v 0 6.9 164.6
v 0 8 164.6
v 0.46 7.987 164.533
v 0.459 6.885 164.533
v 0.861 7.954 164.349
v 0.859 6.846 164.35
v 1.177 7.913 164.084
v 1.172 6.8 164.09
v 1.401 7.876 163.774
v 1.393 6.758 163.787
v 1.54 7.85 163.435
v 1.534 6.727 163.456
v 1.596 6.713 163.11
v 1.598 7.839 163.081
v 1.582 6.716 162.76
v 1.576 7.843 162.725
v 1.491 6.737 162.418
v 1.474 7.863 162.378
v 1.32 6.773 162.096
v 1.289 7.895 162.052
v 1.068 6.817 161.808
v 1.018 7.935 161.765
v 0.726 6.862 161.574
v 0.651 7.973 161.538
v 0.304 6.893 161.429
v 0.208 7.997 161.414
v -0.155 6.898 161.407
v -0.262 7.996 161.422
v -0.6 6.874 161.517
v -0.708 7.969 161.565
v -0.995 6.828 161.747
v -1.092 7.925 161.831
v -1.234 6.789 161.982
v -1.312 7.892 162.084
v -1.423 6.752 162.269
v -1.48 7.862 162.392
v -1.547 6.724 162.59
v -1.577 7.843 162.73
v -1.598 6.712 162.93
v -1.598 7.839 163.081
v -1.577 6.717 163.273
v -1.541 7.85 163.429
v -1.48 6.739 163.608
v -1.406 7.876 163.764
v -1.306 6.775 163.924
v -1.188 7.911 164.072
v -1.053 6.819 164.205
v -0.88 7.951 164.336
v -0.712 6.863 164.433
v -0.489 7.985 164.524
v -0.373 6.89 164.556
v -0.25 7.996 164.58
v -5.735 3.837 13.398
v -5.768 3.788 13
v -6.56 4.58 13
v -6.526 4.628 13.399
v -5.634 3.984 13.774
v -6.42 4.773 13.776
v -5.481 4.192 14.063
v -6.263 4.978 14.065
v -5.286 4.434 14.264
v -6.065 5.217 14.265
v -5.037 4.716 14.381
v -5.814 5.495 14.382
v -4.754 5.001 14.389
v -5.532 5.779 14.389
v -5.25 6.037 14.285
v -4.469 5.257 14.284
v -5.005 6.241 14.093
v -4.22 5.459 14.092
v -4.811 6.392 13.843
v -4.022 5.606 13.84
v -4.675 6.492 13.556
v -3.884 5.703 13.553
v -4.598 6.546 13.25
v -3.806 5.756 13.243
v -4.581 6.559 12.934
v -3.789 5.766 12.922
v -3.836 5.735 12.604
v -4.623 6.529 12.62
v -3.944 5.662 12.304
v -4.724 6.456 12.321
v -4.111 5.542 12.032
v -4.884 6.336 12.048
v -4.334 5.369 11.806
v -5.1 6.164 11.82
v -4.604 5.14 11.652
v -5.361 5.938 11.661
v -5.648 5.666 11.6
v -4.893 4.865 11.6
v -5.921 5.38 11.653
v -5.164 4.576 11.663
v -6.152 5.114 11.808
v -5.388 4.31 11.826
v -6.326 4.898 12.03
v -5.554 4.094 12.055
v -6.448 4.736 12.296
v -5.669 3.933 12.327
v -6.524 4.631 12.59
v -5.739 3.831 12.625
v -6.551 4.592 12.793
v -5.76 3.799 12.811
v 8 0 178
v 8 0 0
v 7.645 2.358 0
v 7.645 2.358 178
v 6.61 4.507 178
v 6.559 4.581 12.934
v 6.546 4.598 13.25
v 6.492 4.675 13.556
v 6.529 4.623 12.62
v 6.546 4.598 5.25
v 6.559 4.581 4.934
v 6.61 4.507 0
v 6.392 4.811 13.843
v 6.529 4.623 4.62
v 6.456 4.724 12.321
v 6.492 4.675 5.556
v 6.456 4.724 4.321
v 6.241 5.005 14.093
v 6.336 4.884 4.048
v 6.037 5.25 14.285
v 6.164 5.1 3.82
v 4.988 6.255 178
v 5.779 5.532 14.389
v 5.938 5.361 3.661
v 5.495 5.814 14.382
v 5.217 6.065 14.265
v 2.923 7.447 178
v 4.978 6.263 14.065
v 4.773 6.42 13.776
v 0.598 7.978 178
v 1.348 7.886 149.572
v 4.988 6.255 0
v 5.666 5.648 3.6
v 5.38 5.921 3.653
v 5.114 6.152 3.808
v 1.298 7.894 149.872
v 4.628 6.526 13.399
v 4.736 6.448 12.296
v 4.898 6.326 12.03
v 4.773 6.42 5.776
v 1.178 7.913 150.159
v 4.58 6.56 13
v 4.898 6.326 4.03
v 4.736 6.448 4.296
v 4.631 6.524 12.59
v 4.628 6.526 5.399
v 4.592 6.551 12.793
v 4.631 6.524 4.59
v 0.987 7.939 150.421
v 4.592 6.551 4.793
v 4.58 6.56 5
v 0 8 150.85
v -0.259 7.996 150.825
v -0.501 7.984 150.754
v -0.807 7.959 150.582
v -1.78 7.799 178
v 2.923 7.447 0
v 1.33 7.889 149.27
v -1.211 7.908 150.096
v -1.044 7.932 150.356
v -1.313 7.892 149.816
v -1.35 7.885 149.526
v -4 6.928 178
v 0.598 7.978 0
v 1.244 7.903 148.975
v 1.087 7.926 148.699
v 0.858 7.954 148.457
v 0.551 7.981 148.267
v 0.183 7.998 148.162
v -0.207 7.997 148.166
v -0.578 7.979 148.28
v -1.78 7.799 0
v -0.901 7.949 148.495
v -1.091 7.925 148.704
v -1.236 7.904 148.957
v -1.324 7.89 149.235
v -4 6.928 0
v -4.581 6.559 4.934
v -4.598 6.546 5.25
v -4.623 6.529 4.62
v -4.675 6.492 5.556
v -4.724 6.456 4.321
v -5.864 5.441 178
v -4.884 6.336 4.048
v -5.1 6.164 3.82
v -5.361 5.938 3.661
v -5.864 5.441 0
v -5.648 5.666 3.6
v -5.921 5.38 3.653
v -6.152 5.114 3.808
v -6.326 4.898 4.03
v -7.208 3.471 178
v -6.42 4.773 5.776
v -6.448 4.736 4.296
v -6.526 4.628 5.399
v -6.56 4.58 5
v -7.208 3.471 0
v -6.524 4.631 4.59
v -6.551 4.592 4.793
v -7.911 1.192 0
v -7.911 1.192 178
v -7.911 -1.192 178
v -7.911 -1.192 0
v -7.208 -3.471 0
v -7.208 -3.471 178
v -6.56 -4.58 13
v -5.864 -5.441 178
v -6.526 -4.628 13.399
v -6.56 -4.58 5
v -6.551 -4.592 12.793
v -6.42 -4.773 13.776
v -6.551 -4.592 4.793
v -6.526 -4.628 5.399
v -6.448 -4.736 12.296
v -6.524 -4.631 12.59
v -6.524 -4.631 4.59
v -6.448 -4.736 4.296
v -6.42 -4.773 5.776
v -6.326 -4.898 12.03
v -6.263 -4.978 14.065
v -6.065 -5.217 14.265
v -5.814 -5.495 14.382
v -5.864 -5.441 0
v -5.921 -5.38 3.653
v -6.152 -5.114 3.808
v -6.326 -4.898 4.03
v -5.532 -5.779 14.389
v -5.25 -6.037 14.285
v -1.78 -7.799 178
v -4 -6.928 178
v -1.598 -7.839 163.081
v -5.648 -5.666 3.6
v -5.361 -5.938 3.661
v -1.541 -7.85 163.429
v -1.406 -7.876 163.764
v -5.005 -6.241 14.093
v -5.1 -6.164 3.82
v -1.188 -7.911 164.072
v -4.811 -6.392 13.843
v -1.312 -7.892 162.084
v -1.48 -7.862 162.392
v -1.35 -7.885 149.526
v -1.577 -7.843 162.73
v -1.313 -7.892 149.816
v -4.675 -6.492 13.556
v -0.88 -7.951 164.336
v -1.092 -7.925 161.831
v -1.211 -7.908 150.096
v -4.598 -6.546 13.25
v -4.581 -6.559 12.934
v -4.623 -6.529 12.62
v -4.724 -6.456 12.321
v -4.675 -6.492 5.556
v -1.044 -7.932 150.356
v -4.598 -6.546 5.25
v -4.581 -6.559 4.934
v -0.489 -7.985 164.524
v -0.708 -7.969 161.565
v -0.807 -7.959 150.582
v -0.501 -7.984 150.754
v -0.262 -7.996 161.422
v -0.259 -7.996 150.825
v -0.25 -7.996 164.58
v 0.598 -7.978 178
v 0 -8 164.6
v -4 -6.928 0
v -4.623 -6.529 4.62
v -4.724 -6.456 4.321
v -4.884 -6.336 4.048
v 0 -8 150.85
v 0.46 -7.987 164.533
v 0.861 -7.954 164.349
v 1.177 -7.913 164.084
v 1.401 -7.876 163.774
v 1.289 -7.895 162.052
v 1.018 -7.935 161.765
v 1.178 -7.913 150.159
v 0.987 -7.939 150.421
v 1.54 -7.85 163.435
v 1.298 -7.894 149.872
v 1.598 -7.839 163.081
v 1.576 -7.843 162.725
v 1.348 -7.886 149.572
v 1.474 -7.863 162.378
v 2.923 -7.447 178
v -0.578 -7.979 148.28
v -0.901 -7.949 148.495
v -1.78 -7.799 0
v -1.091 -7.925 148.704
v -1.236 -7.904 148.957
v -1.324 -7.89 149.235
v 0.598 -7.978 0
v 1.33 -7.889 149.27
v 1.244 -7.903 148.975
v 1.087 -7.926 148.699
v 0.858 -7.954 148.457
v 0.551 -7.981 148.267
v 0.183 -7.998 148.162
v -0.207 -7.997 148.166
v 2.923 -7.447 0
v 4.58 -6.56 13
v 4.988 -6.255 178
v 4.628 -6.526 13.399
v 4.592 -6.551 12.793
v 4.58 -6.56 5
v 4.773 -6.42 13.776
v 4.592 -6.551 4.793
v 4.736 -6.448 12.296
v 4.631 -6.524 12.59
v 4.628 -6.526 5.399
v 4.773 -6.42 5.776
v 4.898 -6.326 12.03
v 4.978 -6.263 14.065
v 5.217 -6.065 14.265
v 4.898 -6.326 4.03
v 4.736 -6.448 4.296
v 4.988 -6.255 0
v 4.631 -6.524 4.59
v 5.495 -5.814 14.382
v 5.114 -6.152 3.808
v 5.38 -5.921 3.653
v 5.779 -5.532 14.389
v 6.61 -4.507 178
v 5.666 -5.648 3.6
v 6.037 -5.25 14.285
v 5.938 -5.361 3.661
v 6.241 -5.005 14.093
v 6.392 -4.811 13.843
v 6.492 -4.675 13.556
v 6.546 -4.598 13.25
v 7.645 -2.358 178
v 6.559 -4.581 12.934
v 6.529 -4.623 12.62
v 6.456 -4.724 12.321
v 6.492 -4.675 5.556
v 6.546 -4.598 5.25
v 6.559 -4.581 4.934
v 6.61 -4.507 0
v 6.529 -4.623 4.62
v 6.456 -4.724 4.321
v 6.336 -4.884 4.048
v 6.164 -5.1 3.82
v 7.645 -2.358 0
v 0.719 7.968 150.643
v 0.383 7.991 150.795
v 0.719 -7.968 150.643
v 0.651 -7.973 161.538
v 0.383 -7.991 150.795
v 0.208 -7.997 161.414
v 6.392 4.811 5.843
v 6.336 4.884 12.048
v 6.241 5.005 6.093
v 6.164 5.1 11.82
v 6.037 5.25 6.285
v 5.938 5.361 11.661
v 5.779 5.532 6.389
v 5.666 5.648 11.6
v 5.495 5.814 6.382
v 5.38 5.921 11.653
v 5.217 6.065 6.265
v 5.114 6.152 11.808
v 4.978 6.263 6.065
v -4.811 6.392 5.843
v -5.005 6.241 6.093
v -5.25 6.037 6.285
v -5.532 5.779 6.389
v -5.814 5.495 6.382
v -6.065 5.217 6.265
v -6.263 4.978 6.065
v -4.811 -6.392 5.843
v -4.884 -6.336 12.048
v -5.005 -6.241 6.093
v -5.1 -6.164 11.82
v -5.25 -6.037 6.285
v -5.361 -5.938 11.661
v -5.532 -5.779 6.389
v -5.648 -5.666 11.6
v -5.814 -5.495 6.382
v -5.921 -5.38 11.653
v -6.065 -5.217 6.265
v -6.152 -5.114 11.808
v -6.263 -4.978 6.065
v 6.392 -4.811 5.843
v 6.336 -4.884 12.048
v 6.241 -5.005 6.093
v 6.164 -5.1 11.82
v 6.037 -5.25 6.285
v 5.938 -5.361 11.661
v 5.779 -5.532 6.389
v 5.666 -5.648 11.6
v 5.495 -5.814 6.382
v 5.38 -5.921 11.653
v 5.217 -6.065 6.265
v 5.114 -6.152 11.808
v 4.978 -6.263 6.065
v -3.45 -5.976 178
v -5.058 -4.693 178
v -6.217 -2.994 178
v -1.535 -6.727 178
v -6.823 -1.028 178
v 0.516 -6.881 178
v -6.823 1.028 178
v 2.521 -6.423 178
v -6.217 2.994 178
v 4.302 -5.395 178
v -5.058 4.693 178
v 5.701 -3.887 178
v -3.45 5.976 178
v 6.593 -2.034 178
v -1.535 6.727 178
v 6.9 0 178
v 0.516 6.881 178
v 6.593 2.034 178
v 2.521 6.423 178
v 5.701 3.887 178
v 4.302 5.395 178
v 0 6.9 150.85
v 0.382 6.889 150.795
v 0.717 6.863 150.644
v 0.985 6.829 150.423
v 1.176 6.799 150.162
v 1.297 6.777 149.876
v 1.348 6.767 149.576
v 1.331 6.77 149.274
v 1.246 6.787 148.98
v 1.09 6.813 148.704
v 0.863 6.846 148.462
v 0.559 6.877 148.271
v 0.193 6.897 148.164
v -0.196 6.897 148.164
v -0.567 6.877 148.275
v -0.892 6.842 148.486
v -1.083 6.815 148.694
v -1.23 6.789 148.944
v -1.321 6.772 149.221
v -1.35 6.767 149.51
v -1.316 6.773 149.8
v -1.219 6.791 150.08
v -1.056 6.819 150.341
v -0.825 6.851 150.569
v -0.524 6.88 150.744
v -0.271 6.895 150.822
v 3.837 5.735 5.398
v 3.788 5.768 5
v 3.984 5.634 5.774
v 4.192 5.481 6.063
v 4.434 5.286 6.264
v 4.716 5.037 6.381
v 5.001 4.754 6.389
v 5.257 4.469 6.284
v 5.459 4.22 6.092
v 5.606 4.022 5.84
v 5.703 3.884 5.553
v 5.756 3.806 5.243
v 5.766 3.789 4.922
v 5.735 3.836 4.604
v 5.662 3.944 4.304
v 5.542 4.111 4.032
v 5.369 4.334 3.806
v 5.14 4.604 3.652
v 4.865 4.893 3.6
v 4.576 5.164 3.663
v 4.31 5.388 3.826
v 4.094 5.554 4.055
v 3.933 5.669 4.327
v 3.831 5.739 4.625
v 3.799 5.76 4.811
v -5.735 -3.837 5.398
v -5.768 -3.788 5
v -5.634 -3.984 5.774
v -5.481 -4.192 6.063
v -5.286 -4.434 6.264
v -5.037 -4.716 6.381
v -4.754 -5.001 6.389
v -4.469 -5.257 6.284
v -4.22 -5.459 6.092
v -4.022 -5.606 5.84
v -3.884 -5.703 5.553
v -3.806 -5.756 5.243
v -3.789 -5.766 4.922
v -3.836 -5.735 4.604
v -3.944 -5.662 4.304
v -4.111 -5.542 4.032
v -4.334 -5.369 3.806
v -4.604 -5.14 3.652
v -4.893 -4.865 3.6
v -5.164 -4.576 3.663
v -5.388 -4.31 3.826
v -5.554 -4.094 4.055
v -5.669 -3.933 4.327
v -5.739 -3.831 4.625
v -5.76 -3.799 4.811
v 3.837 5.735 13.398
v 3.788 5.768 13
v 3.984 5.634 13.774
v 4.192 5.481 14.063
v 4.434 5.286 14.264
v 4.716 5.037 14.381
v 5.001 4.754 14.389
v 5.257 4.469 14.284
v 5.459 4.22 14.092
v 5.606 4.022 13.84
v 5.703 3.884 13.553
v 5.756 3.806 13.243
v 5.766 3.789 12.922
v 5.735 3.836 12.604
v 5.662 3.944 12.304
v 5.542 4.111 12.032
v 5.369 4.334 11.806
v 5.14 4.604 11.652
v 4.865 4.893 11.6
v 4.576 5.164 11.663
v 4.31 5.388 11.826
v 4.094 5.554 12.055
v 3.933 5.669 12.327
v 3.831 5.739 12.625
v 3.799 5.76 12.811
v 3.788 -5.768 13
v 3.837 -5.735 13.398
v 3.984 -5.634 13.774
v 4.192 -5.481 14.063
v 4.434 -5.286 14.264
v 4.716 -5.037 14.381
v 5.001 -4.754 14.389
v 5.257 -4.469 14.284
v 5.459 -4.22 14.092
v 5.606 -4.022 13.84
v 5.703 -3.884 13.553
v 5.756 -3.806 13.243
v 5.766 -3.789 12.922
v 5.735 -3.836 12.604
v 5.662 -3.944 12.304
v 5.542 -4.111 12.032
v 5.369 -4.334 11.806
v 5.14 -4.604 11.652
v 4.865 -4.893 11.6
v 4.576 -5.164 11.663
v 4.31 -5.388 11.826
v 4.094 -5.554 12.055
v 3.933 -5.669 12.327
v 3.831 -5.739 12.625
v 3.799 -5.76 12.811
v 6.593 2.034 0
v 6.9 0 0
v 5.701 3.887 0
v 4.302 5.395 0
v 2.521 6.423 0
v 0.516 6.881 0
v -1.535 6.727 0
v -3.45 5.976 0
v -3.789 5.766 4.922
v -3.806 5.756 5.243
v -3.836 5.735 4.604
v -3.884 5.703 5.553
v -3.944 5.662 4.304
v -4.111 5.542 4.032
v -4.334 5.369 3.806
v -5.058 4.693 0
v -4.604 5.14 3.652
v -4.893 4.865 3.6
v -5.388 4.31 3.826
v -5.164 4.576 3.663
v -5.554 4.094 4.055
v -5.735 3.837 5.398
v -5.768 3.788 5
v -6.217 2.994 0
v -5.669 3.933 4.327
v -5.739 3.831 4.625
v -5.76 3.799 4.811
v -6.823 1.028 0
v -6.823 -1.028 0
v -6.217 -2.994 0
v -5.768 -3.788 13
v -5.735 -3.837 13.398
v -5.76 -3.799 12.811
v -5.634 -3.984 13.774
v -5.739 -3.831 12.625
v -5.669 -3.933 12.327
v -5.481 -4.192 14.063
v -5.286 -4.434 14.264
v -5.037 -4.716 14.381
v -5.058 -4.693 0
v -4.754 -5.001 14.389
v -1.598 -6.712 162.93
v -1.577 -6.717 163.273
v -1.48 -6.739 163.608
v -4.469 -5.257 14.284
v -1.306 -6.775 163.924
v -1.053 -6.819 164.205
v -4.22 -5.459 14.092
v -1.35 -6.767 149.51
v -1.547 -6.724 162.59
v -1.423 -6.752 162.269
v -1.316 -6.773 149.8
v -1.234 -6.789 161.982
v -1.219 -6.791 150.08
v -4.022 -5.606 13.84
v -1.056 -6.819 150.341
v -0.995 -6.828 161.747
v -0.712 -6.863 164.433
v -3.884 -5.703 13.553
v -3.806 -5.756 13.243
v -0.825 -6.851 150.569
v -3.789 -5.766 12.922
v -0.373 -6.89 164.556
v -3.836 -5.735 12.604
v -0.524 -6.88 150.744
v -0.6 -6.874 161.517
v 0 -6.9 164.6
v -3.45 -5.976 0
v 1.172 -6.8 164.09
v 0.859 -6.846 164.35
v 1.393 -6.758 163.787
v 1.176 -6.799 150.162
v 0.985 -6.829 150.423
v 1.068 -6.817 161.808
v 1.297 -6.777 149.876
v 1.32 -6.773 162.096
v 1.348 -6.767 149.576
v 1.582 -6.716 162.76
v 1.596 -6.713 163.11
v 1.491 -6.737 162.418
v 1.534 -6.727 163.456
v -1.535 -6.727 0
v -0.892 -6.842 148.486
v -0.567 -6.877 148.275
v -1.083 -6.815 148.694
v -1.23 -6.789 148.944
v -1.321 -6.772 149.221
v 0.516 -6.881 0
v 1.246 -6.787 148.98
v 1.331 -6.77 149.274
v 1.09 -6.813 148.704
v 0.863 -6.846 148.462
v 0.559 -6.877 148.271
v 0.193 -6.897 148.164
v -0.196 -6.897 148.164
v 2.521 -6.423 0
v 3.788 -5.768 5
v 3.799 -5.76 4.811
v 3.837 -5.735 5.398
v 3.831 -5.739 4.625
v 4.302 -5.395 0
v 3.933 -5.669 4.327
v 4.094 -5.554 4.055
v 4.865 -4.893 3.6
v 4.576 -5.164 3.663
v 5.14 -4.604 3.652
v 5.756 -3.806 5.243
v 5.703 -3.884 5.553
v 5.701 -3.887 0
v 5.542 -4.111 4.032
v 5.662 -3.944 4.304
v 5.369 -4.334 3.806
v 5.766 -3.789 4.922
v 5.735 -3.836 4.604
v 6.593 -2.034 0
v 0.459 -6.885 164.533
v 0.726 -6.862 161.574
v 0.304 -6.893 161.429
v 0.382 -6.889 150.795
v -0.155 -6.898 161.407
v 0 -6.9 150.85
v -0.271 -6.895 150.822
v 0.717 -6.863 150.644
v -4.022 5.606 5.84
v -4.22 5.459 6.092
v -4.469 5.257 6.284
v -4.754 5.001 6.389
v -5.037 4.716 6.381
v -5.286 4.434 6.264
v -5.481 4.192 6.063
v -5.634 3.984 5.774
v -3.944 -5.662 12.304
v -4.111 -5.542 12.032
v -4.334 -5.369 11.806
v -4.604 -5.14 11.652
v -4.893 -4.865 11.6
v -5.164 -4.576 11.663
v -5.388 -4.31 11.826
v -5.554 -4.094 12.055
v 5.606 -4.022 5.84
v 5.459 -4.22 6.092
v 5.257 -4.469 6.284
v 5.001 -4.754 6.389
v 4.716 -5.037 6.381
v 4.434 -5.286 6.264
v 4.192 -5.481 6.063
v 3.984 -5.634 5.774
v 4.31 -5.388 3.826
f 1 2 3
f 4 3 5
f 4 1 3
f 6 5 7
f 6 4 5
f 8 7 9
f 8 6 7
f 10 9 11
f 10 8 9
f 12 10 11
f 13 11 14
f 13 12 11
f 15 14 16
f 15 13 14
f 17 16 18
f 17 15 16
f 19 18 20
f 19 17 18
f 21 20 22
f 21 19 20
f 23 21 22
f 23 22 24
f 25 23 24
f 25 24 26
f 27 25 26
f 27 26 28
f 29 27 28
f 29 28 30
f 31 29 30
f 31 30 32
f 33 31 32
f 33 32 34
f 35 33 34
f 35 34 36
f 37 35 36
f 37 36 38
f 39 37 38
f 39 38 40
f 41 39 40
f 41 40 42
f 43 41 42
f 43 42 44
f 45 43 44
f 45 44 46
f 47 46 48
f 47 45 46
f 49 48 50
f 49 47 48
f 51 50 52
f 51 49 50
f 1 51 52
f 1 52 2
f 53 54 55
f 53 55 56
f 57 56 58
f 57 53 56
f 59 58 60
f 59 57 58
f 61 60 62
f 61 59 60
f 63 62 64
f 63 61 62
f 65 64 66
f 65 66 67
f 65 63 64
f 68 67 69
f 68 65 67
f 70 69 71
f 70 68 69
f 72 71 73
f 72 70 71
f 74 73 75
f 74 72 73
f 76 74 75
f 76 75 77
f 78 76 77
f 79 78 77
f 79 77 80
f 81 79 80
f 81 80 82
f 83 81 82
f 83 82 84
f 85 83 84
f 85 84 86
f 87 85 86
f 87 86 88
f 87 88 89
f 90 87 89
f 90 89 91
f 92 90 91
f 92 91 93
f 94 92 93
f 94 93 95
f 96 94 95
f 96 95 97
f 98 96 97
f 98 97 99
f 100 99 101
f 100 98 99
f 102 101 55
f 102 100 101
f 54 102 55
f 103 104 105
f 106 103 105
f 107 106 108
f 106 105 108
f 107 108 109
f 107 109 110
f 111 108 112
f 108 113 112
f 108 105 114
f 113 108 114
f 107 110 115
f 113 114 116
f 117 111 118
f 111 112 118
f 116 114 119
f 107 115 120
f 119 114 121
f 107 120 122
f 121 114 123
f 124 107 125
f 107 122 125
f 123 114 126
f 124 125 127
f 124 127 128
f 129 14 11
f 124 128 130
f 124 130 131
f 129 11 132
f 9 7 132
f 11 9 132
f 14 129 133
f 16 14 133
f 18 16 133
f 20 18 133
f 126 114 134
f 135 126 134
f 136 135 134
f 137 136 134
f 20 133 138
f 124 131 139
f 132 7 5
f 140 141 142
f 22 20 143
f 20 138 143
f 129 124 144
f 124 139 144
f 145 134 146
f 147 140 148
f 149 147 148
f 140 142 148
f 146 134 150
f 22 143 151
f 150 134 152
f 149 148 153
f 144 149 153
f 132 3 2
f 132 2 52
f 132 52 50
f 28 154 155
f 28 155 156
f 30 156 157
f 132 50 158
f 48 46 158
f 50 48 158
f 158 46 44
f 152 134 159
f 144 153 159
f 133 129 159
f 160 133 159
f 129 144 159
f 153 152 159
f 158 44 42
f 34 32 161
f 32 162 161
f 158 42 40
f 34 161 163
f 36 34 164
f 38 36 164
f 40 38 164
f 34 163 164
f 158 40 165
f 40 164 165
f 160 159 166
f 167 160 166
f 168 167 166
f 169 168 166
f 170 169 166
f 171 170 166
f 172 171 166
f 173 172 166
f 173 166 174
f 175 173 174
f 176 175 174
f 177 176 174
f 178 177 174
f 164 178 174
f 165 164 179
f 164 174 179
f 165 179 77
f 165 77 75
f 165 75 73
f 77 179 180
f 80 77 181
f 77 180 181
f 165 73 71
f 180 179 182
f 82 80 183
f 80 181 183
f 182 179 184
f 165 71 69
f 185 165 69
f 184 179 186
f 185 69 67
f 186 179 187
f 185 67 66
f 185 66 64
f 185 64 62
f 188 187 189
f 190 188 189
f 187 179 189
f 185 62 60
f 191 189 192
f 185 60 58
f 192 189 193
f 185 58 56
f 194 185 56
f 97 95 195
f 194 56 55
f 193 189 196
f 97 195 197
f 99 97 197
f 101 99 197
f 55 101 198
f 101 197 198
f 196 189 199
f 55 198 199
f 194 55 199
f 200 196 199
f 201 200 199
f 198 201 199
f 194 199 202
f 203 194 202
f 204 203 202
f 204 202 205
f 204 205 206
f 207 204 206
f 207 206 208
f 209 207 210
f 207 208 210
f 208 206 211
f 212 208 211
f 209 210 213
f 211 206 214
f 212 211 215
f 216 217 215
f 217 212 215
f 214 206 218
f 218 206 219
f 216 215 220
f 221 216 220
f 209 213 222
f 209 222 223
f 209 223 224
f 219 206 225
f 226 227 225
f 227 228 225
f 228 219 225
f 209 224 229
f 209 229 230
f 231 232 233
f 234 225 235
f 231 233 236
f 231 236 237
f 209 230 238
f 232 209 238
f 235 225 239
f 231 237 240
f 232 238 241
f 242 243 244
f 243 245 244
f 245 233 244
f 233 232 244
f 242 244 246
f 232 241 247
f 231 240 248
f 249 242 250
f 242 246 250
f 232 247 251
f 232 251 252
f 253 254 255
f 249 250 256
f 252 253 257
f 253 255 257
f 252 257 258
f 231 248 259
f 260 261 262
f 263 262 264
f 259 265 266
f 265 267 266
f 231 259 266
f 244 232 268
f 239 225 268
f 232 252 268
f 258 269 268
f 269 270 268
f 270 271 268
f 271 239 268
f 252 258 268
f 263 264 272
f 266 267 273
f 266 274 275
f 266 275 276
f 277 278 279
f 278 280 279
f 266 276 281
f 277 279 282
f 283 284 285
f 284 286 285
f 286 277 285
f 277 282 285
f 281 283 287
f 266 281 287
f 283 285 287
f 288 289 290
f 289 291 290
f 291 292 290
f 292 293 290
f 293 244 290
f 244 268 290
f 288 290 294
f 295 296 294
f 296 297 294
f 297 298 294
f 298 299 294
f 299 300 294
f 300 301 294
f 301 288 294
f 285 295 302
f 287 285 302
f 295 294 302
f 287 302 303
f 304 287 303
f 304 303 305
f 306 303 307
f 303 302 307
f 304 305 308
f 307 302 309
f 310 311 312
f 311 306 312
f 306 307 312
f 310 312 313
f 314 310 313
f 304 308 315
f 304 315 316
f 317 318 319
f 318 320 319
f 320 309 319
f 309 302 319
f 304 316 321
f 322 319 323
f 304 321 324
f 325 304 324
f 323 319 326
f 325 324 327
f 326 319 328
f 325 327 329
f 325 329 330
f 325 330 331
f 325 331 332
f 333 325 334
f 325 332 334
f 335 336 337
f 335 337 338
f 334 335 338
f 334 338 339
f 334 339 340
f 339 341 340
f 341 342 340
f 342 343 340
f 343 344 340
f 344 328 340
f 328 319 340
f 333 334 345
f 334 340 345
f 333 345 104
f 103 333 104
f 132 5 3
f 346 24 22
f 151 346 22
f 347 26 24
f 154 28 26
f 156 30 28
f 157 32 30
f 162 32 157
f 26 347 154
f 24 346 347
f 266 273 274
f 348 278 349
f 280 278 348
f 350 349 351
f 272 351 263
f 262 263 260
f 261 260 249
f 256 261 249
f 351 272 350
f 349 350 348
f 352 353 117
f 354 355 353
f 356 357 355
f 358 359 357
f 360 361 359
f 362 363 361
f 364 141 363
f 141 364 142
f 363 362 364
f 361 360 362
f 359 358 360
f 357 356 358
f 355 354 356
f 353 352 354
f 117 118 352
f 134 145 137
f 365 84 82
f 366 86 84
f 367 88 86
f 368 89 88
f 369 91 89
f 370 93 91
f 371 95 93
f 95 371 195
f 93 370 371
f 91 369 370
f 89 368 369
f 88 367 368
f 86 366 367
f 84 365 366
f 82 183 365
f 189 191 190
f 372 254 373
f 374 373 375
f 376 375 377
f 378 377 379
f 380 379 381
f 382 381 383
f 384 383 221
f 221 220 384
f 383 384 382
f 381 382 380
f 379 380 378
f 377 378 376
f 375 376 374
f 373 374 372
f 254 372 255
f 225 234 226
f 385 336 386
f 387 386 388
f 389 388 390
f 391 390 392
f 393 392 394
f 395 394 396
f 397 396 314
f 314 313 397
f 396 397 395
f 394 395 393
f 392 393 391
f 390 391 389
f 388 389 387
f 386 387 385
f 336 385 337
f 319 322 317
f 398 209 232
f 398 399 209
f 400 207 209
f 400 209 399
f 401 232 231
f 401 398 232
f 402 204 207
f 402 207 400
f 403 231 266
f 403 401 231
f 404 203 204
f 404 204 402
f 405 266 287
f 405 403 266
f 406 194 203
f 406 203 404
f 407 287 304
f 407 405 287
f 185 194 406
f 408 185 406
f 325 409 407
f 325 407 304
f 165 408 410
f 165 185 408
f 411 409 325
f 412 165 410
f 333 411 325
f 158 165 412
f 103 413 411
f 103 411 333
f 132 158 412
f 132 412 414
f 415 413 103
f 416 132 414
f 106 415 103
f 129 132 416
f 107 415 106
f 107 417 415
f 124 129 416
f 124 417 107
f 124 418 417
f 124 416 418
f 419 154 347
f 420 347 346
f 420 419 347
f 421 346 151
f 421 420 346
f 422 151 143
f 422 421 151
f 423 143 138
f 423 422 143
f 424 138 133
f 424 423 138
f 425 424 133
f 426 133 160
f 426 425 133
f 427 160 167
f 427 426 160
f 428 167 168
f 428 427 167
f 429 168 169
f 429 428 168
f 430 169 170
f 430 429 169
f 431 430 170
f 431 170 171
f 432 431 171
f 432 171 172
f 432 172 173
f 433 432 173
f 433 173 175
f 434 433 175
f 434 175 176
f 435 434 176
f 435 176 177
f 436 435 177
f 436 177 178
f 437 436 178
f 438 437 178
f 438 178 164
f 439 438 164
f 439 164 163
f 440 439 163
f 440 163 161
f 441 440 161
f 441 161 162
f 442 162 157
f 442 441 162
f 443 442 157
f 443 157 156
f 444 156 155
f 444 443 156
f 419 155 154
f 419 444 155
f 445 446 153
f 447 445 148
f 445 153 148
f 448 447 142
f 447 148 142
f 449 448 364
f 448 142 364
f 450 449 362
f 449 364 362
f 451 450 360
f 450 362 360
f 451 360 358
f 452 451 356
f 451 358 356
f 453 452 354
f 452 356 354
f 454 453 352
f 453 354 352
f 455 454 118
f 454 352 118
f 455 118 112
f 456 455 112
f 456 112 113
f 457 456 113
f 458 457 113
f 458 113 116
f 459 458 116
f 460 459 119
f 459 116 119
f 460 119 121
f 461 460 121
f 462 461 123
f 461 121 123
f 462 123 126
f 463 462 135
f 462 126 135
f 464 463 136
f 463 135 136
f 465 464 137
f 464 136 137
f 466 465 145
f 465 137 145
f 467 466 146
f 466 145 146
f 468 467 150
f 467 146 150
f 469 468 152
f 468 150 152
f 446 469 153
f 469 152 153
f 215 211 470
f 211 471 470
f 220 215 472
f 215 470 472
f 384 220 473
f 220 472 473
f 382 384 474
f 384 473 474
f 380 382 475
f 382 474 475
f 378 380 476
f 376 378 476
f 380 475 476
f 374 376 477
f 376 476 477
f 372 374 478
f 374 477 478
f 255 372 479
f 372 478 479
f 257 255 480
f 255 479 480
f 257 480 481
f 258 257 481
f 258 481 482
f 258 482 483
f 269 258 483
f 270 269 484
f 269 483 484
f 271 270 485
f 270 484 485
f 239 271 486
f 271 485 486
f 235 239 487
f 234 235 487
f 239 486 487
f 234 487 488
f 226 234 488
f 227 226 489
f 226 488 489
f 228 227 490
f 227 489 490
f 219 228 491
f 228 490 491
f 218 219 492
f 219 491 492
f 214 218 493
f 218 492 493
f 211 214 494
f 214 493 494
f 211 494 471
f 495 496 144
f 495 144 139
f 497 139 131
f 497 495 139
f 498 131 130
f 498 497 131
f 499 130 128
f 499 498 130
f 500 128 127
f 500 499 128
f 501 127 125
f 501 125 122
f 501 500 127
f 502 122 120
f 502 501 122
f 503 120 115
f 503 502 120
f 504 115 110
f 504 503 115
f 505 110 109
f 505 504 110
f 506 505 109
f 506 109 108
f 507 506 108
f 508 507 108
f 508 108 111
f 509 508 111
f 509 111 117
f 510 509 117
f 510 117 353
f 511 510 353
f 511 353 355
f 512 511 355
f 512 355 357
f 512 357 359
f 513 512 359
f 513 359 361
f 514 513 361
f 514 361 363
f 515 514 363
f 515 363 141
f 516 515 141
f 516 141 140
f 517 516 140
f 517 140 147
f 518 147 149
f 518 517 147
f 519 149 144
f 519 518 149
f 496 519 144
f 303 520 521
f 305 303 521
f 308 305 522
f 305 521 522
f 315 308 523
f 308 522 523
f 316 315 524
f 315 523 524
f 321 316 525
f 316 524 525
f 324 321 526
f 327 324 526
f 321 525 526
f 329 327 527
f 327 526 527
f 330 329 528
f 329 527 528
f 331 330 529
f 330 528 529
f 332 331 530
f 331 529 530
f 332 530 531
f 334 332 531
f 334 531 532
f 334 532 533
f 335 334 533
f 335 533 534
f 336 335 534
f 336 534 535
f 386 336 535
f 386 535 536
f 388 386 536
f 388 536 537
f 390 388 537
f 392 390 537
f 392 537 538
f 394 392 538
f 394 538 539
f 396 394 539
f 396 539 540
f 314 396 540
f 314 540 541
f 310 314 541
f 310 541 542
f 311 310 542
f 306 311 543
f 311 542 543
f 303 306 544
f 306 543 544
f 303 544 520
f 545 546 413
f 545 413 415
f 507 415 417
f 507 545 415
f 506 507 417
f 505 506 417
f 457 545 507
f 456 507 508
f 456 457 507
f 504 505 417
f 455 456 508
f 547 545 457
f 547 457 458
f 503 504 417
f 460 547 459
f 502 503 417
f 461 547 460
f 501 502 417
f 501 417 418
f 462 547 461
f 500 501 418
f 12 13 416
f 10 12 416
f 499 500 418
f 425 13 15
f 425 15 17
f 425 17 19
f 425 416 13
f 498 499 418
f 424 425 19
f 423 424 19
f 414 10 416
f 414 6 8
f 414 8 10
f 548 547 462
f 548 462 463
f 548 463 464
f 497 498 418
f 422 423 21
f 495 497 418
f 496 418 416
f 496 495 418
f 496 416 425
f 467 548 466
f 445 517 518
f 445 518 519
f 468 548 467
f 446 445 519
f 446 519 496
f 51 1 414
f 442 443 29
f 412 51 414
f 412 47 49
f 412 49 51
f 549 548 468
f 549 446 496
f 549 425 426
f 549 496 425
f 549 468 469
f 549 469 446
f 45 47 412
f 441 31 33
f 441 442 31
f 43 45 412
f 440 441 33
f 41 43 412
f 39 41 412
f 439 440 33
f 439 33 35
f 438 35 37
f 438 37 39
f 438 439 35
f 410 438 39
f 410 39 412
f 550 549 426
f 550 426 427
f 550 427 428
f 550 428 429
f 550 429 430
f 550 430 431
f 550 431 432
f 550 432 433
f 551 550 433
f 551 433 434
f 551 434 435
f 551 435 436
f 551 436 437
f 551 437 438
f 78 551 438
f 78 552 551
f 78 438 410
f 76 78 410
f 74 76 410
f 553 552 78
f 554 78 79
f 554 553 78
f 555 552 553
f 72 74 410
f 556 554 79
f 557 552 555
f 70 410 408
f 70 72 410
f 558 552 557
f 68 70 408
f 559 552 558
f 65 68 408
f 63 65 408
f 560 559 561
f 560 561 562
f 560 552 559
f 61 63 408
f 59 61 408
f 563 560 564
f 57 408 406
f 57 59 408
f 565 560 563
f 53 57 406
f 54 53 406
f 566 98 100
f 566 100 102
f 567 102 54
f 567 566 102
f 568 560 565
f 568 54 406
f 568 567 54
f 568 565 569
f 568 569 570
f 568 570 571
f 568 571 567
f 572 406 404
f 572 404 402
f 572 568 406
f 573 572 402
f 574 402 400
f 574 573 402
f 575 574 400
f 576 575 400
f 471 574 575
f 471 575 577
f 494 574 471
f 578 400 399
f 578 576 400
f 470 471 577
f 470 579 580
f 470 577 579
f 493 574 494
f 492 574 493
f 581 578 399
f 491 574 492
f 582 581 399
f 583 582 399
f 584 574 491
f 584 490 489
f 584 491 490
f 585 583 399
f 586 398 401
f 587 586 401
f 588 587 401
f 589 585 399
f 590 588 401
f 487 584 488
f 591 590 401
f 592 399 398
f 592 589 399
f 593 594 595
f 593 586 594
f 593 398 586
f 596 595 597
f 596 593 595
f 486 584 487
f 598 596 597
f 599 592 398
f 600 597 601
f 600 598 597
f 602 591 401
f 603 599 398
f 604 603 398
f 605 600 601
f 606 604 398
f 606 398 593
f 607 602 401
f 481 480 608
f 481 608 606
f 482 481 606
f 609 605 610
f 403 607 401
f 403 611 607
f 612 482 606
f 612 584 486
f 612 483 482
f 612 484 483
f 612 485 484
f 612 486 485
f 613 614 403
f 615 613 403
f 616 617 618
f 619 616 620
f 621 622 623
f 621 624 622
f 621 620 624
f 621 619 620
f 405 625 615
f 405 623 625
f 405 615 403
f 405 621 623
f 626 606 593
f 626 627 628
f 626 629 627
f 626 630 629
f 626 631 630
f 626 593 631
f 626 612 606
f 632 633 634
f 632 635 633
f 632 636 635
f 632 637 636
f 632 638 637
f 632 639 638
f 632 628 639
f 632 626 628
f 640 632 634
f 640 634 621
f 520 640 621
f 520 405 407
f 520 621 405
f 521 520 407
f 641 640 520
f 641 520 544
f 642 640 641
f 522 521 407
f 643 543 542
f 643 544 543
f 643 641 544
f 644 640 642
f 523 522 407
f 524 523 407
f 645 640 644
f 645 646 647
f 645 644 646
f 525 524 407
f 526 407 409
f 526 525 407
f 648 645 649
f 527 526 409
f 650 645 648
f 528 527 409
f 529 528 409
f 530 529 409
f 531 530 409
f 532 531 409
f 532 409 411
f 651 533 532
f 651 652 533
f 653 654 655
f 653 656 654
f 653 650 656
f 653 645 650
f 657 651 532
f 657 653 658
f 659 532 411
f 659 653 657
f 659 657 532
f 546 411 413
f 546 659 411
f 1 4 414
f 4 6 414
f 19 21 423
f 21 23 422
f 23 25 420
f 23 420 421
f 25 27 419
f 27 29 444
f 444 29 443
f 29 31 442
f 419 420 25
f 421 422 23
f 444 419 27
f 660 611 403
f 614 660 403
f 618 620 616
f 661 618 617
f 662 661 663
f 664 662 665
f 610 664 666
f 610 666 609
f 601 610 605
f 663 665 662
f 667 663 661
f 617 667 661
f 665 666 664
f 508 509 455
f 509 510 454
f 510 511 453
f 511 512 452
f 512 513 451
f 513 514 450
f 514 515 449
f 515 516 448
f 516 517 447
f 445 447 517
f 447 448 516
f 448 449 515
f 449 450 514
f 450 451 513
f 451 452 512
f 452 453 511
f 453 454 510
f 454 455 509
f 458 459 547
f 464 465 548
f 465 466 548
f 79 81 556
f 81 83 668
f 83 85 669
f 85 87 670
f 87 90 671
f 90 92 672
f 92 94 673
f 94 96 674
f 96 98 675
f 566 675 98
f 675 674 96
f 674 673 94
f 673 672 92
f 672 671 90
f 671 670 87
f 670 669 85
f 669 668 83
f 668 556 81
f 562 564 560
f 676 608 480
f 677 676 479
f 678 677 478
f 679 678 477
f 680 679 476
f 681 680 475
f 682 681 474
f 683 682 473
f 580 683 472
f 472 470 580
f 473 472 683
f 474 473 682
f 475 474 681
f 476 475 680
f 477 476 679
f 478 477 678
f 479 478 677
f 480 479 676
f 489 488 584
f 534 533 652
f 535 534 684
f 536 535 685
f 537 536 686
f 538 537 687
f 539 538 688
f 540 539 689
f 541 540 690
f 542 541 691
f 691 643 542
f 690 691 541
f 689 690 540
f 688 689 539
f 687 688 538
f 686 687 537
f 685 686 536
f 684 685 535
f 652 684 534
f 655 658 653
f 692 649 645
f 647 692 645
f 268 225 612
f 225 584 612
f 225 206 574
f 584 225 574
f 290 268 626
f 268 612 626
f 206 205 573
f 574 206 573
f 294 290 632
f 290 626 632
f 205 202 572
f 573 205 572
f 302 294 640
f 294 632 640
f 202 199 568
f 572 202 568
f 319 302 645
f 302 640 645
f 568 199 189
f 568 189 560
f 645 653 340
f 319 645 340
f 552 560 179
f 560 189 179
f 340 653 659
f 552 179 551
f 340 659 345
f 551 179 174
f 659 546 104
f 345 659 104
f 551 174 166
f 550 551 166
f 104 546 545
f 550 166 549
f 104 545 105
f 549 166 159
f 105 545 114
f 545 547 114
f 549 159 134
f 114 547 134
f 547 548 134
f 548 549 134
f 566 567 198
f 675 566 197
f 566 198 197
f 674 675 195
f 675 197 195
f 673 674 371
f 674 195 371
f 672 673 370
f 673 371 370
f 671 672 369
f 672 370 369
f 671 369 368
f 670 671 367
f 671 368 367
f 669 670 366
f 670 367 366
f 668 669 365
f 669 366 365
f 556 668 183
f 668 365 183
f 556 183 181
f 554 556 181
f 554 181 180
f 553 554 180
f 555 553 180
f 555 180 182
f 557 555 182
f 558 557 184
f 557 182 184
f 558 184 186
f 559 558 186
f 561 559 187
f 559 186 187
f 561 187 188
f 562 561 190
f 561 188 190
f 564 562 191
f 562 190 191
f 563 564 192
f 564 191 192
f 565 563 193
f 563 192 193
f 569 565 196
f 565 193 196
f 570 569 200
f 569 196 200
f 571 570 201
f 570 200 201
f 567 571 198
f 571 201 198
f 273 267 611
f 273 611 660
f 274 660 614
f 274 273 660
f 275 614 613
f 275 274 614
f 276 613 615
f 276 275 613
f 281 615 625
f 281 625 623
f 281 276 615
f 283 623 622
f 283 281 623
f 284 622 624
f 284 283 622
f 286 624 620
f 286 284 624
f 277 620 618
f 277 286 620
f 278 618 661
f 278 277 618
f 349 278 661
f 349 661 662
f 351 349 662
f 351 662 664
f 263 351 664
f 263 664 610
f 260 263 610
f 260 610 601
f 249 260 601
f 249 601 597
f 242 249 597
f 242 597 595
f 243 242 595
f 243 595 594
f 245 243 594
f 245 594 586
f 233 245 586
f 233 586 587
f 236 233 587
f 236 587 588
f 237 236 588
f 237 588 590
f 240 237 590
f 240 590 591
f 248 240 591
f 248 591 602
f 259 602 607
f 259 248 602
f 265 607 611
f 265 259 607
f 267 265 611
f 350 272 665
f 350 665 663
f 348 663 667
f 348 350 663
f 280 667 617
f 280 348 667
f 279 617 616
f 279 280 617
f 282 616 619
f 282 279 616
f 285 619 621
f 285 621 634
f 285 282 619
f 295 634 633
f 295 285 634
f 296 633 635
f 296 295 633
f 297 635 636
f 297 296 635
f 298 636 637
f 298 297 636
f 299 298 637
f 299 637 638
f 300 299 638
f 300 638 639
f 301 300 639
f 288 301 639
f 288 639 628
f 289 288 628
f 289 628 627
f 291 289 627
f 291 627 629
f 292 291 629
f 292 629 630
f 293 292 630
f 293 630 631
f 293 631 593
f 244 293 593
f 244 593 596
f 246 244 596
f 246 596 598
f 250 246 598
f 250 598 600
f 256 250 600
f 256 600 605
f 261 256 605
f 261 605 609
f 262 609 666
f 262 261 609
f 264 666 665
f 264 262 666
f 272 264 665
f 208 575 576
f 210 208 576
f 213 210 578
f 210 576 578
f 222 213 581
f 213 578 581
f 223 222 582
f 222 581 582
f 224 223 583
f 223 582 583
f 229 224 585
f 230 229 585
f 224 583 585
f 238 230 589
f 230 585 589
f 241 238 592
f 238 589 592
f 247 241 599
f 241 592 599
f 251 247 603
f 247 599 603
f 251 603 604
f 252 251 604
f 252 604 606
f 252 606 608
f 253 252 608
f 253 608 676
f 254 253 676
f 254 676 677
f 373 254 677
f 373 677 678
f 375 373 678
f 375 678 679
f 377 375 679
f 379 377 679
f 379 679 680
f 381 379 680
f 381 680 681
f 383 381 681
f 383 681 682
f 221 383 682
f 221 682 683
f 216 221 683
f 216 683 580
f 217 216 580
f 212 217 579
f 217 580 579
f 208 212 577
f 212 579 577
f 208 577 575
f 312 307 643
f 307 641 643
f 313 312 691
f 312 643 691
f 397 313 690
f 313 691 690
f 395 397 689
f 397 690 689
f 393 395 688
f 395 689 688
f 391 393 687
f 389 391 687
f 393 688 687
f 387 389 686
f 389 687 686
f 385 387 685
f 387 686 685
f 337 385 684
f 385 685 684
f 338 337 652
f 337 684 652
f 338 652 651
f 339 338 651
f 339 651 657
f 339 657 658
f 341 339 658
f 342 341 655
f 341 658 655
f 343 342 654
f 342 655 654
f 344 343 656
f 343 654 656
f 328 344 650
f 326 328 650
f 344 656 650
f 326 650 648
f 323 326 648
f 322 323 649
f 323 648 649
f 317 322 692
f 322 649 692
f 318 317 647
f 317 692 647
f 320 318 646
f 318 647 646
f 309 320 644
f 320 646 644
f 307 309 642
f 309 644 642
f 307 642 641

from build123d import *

# Parameters (mm, degrees)
SKETCH1_R               = 8
SKETCH1_R_2             = 6.9
BOSS_EXTRUDE1_DEPTH     = 163
SKETCH3_R               = 8
SKETCH3_R_2             = 6.9
BOSS_EXTRUDE3_DEPTH     = 15
CUT_EXTRUDE1_DEPTH      = 179.359188157
CUT_EXTRUDE1_DEPTH_BACK = 179.359188157
SKETCH2_R               = 1.6
SKETCH2_R_2             = 1.35
SKETCH4_R               = 1.4
CUT_EXTRUDE2_DEPTH      = 179.359188267
CIRPATTERN1_COUNT       = 2
CIRPATTERN1_ANGLE       = 90


with BuildPart() as part:
    # Sketch1 → Boss-Extrude1 (new body)
    with BuildSketch(Plane.XY):
        Circle(SKETCH1_R)
        Circle(SKETCH1_R_2, mode=Mode.SUBTRACT)
    extrude(amount=BOSS_EXTRUDE1_DEPTH)

    # Sketch3 → Boss-Extrude3 (add)
    with BuildSketch(Plane.XY.offset(163)):
        Circle(SKETCH3_R)
        Circle(SKETCH3_R_2, mode=Mode.SUBTRACT)
    extrude(amount=BOSS_EXTRUDE3_DEPTH)

    # Sketch2 → Cut-Extrude1 (cut, two sides: drawn at the far end of the back side and taken through both)
    with BuildSketch(Plane(origin=(0, 0, 0), x_dir=(1, 0, 0), z_dir=(0, 1, 0)).offset(-CUT_EXTRUDE1_DEPTH_BACK)):
        with Locations(Location((0, -163, 0), (0, 0, 270))):
            Circle(SKETCH2_R)
        with Locations(Location((0, -149.5, 0), (0, 0, 270))):
            Circle(SKETCH2_R_2)
    extrude(amount=CUT_EXTRUDE1_DEPTH + CUT_EXTRUDE1_DEPTH_BACK, mode=Mode.SUBTRACT)

    # Sketch4 → Cut-Extrude2 (cut, symmetric)
    with BuildSketch(Plane(origin=(0, 0, 0), x_dir=(0, 0, 1), z_dir=(0.7071067811865464, 0.7071067811865488, 0))):
        with Locations(Location((13, 0, 0), (0, 0, 270))):
            Circle(SKETCH4_R)
        with Locations(Location((5, 0, 0), (0, 0, 270))):
            Circle(SKETCH4_R)
    cut_extrude2 = extrude(amount=CUT_EXTRUDE2_DEPTH, both=True, mode=Mode.SUBTRACT)

    # CirPattern1: Cut-Extrude2 ×2 about axis
    cirpattern1_axis = Axis((0, 0, -8.9), (0, 0, 1))
    for i in range(1, CIRPATTERN1_COUNT):
        add(cut_extrude2.rotate(cirpattern1_axis, i * CIRPATTERN1_ANGLE / (CIRPATTERN1_COUNT - 1)), mode=Mode.SUBTRACT)


solid = part.part
